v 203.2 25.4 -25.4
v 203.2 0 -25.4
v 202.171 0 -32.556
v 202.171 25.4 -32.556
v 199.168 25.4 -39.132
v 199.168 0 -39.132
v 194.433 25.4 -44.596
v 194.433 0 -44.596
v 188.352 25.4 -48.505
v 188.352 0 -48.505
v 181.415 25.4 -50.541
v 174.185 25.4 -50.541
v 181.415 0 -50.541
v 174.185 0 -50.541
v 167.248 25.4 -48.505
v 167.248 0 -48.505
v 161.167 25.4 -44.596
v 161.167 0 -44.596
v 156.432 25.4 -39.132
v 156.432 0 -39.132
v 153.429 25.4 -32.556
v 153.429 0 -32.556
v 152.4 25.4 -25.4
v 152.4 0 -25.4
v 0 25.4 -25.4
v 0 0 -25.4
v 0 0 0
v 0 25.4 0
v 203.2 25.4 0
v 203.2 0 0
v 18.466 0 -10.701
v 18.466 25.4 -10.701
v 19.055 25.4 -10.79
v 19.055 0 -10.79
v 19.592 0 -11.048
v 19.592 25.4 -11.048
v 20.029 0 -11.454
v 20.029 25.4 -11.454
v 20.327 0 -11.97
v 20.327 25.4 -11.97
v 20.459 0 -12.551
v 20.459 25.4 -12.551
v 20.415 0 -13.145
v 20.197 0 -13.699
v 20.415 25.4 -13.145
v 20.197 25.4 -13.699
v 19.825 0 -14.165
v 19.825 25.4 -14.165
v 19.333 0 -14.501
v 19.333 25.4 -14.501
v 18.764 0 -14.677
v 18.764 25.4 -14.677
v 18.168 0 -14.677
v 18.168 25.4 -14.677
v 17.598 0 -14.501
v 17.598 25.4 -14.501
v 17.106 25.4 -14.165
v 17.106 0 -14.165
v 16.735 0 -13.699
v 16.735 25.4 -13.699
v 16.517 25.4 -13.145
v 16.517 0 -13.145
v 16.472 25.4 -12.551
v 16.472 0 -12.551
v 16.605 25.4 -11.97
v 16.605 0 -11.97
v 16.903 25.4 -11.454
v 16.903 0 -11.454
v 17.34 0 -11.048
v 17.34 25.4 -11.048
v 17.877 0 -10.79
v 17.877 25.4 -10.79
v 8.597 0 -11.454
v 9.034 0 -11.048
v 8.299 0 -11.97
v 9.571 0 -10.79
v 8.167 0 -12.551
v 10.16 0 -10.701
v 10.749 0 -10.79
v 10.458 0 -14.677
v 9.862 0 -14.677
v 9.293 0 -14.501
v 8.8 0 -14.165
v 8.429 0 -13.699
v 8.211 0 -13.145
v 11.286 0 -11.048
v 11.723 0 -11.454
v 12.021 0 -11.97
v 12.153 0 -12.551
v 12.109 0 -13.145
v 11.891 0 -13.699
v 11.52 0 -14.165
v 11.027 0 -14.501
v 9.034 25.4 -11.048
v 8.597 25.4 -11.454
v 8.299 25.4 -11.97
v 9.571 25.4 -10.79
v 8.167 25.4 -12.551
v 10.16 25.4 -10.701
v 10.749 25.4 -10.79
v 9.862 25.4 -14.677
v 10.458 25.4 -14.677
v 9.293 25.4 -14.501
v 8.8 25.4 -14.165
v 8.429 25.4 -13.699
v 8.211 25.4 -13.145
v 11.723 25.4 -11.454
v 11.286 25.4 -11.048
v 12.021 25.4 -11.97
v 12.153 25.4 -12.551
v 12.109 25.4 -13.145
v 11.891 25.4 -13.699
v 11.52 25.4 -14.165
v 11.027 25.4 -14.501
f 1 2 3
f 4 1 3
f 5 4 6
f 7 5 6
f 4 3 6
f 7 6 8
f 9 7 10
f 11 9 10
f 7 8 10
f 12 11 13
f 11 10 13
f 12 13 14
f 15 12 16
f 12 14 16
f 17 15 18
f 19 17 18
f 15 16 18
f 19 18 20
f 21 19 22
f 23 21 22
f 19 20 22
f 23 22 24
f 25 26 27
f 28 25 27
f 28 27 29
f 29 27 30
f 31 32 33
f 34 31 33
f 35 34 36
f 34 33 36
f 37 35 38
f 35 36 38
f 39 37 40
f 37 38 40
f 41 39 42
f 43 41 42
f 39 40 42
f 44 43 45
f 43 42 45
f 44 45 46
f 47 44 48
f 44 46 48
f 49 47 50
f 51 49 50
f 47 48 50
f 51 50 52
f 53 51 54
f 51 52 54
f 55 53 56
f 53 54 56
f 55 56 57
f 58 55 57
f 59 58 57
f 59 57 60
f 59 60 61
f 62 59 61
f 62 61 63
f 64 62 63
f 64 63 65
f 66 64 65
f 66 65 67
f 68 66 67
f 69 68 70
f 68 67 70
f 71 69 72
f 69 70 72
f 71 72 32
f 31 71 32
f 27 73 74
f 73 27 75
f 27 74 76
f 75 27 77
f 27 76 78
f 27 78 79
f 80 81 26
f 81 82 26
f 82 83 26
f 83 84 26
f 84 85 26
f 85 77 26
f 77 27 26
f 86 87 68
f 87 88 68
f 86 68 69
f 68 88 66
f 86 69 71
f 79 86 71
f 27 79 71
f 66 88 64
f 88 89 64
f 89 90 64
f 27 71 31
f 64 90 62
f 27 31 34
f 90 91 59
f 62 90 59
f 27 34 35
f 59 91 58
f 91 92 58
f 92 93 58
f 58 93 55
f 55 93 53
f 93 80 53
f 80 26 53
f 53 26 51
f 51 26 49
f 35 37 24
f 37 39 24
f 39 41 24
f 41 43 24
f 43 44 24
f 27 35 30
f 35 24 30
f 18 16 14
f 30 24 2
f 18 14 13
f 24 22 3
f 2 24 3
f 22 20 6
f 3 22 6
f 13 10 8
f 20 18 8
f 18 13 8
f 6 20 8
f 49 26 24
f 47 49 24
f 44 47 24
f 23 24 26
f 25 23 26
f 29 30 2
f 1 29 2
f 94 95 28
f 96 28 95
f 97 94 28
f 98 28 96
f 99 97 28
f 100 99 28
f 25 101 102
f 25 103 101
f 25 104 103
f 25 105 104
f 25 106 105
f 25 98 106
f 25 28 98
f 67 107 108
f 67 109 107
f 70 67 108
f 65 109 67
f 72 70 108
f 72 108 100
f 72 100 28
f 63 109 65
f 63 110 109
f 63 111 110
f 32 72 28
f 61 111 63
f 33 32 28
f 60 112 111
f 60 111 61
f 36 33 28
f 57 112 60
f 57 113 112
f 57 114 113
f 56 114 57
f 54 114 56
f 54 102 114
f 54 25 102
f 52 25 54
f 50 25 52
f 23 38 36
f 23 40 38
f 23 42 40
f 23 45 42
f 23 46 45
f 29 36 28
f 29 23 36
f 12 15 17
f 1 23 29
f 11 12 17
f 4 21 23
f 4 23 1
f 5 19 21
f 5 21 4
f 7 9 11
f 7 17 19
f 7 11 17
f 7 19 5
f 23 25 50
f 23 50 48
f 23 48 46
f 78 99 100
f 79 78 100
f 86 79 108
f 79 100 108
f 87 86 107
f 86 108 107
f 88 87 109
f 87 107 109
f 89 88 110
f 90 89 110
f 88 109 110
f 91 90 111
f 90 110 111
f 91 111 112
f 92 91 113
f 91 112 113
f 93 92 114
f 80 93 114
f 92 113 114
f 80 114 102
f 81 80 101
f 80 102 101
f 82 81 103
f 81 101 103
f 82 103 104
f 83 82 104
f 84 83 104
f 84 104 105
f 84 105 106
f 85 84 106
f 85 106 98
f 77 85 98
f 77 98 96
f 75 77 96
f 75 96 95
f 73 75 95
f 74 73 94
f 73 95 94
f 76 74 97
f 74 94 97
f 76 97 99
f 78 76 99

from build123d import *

# Parameters (mm, degrees)
BOSS_EXTRUDE1_DEPTH = 25.4
SKETCH2_R           = 1.99898
CUT_EXTRUDE1_DEPTH  = 25.4


with BuildPart() as part:
    # Sketch1 → Boss-Extrude1 (new body)
    with BuildSketch(Plane(origin=(0, 0, 0), x_dir=(1, 0, 0), z_dir=(0, 1, 0))):
        with BuildLine():
            Line((0, 0), (203.2, 0))
            Line((203.2, 0), (203.2, 25.4))
            ThreePointArc((203.2, 25.4), (177.8, 50.8), (152.4, 25.4))
            Line((152.4, 25.4), (0, 25.4))
            Line((0, 25.4), (0, 0))
        make_face()
    extrude(amount=BOSS_EXTRUDE1_DEPTH)

    # Sketch2 → Cut-Extrude1 (cut)
    with BuildSketch(Plane(origin=(0, 25.4, 0), x_dir=(1, 0, 0), z_dir=(0, 1, 0))):
        with Locations(Location((10.16, 12.7, 0), (0, 0, 270))):
            Circle(SKETCH2_R)
        with Locations(Location((18.4658, 12.7, 0), (0, 0, 270))):
            Circle(SKETCH2_R)
    extrude(amount=-CUT_EXTRUDE1_DEPTH, mode=Mode.SUBTRACT)


solid = part.part
